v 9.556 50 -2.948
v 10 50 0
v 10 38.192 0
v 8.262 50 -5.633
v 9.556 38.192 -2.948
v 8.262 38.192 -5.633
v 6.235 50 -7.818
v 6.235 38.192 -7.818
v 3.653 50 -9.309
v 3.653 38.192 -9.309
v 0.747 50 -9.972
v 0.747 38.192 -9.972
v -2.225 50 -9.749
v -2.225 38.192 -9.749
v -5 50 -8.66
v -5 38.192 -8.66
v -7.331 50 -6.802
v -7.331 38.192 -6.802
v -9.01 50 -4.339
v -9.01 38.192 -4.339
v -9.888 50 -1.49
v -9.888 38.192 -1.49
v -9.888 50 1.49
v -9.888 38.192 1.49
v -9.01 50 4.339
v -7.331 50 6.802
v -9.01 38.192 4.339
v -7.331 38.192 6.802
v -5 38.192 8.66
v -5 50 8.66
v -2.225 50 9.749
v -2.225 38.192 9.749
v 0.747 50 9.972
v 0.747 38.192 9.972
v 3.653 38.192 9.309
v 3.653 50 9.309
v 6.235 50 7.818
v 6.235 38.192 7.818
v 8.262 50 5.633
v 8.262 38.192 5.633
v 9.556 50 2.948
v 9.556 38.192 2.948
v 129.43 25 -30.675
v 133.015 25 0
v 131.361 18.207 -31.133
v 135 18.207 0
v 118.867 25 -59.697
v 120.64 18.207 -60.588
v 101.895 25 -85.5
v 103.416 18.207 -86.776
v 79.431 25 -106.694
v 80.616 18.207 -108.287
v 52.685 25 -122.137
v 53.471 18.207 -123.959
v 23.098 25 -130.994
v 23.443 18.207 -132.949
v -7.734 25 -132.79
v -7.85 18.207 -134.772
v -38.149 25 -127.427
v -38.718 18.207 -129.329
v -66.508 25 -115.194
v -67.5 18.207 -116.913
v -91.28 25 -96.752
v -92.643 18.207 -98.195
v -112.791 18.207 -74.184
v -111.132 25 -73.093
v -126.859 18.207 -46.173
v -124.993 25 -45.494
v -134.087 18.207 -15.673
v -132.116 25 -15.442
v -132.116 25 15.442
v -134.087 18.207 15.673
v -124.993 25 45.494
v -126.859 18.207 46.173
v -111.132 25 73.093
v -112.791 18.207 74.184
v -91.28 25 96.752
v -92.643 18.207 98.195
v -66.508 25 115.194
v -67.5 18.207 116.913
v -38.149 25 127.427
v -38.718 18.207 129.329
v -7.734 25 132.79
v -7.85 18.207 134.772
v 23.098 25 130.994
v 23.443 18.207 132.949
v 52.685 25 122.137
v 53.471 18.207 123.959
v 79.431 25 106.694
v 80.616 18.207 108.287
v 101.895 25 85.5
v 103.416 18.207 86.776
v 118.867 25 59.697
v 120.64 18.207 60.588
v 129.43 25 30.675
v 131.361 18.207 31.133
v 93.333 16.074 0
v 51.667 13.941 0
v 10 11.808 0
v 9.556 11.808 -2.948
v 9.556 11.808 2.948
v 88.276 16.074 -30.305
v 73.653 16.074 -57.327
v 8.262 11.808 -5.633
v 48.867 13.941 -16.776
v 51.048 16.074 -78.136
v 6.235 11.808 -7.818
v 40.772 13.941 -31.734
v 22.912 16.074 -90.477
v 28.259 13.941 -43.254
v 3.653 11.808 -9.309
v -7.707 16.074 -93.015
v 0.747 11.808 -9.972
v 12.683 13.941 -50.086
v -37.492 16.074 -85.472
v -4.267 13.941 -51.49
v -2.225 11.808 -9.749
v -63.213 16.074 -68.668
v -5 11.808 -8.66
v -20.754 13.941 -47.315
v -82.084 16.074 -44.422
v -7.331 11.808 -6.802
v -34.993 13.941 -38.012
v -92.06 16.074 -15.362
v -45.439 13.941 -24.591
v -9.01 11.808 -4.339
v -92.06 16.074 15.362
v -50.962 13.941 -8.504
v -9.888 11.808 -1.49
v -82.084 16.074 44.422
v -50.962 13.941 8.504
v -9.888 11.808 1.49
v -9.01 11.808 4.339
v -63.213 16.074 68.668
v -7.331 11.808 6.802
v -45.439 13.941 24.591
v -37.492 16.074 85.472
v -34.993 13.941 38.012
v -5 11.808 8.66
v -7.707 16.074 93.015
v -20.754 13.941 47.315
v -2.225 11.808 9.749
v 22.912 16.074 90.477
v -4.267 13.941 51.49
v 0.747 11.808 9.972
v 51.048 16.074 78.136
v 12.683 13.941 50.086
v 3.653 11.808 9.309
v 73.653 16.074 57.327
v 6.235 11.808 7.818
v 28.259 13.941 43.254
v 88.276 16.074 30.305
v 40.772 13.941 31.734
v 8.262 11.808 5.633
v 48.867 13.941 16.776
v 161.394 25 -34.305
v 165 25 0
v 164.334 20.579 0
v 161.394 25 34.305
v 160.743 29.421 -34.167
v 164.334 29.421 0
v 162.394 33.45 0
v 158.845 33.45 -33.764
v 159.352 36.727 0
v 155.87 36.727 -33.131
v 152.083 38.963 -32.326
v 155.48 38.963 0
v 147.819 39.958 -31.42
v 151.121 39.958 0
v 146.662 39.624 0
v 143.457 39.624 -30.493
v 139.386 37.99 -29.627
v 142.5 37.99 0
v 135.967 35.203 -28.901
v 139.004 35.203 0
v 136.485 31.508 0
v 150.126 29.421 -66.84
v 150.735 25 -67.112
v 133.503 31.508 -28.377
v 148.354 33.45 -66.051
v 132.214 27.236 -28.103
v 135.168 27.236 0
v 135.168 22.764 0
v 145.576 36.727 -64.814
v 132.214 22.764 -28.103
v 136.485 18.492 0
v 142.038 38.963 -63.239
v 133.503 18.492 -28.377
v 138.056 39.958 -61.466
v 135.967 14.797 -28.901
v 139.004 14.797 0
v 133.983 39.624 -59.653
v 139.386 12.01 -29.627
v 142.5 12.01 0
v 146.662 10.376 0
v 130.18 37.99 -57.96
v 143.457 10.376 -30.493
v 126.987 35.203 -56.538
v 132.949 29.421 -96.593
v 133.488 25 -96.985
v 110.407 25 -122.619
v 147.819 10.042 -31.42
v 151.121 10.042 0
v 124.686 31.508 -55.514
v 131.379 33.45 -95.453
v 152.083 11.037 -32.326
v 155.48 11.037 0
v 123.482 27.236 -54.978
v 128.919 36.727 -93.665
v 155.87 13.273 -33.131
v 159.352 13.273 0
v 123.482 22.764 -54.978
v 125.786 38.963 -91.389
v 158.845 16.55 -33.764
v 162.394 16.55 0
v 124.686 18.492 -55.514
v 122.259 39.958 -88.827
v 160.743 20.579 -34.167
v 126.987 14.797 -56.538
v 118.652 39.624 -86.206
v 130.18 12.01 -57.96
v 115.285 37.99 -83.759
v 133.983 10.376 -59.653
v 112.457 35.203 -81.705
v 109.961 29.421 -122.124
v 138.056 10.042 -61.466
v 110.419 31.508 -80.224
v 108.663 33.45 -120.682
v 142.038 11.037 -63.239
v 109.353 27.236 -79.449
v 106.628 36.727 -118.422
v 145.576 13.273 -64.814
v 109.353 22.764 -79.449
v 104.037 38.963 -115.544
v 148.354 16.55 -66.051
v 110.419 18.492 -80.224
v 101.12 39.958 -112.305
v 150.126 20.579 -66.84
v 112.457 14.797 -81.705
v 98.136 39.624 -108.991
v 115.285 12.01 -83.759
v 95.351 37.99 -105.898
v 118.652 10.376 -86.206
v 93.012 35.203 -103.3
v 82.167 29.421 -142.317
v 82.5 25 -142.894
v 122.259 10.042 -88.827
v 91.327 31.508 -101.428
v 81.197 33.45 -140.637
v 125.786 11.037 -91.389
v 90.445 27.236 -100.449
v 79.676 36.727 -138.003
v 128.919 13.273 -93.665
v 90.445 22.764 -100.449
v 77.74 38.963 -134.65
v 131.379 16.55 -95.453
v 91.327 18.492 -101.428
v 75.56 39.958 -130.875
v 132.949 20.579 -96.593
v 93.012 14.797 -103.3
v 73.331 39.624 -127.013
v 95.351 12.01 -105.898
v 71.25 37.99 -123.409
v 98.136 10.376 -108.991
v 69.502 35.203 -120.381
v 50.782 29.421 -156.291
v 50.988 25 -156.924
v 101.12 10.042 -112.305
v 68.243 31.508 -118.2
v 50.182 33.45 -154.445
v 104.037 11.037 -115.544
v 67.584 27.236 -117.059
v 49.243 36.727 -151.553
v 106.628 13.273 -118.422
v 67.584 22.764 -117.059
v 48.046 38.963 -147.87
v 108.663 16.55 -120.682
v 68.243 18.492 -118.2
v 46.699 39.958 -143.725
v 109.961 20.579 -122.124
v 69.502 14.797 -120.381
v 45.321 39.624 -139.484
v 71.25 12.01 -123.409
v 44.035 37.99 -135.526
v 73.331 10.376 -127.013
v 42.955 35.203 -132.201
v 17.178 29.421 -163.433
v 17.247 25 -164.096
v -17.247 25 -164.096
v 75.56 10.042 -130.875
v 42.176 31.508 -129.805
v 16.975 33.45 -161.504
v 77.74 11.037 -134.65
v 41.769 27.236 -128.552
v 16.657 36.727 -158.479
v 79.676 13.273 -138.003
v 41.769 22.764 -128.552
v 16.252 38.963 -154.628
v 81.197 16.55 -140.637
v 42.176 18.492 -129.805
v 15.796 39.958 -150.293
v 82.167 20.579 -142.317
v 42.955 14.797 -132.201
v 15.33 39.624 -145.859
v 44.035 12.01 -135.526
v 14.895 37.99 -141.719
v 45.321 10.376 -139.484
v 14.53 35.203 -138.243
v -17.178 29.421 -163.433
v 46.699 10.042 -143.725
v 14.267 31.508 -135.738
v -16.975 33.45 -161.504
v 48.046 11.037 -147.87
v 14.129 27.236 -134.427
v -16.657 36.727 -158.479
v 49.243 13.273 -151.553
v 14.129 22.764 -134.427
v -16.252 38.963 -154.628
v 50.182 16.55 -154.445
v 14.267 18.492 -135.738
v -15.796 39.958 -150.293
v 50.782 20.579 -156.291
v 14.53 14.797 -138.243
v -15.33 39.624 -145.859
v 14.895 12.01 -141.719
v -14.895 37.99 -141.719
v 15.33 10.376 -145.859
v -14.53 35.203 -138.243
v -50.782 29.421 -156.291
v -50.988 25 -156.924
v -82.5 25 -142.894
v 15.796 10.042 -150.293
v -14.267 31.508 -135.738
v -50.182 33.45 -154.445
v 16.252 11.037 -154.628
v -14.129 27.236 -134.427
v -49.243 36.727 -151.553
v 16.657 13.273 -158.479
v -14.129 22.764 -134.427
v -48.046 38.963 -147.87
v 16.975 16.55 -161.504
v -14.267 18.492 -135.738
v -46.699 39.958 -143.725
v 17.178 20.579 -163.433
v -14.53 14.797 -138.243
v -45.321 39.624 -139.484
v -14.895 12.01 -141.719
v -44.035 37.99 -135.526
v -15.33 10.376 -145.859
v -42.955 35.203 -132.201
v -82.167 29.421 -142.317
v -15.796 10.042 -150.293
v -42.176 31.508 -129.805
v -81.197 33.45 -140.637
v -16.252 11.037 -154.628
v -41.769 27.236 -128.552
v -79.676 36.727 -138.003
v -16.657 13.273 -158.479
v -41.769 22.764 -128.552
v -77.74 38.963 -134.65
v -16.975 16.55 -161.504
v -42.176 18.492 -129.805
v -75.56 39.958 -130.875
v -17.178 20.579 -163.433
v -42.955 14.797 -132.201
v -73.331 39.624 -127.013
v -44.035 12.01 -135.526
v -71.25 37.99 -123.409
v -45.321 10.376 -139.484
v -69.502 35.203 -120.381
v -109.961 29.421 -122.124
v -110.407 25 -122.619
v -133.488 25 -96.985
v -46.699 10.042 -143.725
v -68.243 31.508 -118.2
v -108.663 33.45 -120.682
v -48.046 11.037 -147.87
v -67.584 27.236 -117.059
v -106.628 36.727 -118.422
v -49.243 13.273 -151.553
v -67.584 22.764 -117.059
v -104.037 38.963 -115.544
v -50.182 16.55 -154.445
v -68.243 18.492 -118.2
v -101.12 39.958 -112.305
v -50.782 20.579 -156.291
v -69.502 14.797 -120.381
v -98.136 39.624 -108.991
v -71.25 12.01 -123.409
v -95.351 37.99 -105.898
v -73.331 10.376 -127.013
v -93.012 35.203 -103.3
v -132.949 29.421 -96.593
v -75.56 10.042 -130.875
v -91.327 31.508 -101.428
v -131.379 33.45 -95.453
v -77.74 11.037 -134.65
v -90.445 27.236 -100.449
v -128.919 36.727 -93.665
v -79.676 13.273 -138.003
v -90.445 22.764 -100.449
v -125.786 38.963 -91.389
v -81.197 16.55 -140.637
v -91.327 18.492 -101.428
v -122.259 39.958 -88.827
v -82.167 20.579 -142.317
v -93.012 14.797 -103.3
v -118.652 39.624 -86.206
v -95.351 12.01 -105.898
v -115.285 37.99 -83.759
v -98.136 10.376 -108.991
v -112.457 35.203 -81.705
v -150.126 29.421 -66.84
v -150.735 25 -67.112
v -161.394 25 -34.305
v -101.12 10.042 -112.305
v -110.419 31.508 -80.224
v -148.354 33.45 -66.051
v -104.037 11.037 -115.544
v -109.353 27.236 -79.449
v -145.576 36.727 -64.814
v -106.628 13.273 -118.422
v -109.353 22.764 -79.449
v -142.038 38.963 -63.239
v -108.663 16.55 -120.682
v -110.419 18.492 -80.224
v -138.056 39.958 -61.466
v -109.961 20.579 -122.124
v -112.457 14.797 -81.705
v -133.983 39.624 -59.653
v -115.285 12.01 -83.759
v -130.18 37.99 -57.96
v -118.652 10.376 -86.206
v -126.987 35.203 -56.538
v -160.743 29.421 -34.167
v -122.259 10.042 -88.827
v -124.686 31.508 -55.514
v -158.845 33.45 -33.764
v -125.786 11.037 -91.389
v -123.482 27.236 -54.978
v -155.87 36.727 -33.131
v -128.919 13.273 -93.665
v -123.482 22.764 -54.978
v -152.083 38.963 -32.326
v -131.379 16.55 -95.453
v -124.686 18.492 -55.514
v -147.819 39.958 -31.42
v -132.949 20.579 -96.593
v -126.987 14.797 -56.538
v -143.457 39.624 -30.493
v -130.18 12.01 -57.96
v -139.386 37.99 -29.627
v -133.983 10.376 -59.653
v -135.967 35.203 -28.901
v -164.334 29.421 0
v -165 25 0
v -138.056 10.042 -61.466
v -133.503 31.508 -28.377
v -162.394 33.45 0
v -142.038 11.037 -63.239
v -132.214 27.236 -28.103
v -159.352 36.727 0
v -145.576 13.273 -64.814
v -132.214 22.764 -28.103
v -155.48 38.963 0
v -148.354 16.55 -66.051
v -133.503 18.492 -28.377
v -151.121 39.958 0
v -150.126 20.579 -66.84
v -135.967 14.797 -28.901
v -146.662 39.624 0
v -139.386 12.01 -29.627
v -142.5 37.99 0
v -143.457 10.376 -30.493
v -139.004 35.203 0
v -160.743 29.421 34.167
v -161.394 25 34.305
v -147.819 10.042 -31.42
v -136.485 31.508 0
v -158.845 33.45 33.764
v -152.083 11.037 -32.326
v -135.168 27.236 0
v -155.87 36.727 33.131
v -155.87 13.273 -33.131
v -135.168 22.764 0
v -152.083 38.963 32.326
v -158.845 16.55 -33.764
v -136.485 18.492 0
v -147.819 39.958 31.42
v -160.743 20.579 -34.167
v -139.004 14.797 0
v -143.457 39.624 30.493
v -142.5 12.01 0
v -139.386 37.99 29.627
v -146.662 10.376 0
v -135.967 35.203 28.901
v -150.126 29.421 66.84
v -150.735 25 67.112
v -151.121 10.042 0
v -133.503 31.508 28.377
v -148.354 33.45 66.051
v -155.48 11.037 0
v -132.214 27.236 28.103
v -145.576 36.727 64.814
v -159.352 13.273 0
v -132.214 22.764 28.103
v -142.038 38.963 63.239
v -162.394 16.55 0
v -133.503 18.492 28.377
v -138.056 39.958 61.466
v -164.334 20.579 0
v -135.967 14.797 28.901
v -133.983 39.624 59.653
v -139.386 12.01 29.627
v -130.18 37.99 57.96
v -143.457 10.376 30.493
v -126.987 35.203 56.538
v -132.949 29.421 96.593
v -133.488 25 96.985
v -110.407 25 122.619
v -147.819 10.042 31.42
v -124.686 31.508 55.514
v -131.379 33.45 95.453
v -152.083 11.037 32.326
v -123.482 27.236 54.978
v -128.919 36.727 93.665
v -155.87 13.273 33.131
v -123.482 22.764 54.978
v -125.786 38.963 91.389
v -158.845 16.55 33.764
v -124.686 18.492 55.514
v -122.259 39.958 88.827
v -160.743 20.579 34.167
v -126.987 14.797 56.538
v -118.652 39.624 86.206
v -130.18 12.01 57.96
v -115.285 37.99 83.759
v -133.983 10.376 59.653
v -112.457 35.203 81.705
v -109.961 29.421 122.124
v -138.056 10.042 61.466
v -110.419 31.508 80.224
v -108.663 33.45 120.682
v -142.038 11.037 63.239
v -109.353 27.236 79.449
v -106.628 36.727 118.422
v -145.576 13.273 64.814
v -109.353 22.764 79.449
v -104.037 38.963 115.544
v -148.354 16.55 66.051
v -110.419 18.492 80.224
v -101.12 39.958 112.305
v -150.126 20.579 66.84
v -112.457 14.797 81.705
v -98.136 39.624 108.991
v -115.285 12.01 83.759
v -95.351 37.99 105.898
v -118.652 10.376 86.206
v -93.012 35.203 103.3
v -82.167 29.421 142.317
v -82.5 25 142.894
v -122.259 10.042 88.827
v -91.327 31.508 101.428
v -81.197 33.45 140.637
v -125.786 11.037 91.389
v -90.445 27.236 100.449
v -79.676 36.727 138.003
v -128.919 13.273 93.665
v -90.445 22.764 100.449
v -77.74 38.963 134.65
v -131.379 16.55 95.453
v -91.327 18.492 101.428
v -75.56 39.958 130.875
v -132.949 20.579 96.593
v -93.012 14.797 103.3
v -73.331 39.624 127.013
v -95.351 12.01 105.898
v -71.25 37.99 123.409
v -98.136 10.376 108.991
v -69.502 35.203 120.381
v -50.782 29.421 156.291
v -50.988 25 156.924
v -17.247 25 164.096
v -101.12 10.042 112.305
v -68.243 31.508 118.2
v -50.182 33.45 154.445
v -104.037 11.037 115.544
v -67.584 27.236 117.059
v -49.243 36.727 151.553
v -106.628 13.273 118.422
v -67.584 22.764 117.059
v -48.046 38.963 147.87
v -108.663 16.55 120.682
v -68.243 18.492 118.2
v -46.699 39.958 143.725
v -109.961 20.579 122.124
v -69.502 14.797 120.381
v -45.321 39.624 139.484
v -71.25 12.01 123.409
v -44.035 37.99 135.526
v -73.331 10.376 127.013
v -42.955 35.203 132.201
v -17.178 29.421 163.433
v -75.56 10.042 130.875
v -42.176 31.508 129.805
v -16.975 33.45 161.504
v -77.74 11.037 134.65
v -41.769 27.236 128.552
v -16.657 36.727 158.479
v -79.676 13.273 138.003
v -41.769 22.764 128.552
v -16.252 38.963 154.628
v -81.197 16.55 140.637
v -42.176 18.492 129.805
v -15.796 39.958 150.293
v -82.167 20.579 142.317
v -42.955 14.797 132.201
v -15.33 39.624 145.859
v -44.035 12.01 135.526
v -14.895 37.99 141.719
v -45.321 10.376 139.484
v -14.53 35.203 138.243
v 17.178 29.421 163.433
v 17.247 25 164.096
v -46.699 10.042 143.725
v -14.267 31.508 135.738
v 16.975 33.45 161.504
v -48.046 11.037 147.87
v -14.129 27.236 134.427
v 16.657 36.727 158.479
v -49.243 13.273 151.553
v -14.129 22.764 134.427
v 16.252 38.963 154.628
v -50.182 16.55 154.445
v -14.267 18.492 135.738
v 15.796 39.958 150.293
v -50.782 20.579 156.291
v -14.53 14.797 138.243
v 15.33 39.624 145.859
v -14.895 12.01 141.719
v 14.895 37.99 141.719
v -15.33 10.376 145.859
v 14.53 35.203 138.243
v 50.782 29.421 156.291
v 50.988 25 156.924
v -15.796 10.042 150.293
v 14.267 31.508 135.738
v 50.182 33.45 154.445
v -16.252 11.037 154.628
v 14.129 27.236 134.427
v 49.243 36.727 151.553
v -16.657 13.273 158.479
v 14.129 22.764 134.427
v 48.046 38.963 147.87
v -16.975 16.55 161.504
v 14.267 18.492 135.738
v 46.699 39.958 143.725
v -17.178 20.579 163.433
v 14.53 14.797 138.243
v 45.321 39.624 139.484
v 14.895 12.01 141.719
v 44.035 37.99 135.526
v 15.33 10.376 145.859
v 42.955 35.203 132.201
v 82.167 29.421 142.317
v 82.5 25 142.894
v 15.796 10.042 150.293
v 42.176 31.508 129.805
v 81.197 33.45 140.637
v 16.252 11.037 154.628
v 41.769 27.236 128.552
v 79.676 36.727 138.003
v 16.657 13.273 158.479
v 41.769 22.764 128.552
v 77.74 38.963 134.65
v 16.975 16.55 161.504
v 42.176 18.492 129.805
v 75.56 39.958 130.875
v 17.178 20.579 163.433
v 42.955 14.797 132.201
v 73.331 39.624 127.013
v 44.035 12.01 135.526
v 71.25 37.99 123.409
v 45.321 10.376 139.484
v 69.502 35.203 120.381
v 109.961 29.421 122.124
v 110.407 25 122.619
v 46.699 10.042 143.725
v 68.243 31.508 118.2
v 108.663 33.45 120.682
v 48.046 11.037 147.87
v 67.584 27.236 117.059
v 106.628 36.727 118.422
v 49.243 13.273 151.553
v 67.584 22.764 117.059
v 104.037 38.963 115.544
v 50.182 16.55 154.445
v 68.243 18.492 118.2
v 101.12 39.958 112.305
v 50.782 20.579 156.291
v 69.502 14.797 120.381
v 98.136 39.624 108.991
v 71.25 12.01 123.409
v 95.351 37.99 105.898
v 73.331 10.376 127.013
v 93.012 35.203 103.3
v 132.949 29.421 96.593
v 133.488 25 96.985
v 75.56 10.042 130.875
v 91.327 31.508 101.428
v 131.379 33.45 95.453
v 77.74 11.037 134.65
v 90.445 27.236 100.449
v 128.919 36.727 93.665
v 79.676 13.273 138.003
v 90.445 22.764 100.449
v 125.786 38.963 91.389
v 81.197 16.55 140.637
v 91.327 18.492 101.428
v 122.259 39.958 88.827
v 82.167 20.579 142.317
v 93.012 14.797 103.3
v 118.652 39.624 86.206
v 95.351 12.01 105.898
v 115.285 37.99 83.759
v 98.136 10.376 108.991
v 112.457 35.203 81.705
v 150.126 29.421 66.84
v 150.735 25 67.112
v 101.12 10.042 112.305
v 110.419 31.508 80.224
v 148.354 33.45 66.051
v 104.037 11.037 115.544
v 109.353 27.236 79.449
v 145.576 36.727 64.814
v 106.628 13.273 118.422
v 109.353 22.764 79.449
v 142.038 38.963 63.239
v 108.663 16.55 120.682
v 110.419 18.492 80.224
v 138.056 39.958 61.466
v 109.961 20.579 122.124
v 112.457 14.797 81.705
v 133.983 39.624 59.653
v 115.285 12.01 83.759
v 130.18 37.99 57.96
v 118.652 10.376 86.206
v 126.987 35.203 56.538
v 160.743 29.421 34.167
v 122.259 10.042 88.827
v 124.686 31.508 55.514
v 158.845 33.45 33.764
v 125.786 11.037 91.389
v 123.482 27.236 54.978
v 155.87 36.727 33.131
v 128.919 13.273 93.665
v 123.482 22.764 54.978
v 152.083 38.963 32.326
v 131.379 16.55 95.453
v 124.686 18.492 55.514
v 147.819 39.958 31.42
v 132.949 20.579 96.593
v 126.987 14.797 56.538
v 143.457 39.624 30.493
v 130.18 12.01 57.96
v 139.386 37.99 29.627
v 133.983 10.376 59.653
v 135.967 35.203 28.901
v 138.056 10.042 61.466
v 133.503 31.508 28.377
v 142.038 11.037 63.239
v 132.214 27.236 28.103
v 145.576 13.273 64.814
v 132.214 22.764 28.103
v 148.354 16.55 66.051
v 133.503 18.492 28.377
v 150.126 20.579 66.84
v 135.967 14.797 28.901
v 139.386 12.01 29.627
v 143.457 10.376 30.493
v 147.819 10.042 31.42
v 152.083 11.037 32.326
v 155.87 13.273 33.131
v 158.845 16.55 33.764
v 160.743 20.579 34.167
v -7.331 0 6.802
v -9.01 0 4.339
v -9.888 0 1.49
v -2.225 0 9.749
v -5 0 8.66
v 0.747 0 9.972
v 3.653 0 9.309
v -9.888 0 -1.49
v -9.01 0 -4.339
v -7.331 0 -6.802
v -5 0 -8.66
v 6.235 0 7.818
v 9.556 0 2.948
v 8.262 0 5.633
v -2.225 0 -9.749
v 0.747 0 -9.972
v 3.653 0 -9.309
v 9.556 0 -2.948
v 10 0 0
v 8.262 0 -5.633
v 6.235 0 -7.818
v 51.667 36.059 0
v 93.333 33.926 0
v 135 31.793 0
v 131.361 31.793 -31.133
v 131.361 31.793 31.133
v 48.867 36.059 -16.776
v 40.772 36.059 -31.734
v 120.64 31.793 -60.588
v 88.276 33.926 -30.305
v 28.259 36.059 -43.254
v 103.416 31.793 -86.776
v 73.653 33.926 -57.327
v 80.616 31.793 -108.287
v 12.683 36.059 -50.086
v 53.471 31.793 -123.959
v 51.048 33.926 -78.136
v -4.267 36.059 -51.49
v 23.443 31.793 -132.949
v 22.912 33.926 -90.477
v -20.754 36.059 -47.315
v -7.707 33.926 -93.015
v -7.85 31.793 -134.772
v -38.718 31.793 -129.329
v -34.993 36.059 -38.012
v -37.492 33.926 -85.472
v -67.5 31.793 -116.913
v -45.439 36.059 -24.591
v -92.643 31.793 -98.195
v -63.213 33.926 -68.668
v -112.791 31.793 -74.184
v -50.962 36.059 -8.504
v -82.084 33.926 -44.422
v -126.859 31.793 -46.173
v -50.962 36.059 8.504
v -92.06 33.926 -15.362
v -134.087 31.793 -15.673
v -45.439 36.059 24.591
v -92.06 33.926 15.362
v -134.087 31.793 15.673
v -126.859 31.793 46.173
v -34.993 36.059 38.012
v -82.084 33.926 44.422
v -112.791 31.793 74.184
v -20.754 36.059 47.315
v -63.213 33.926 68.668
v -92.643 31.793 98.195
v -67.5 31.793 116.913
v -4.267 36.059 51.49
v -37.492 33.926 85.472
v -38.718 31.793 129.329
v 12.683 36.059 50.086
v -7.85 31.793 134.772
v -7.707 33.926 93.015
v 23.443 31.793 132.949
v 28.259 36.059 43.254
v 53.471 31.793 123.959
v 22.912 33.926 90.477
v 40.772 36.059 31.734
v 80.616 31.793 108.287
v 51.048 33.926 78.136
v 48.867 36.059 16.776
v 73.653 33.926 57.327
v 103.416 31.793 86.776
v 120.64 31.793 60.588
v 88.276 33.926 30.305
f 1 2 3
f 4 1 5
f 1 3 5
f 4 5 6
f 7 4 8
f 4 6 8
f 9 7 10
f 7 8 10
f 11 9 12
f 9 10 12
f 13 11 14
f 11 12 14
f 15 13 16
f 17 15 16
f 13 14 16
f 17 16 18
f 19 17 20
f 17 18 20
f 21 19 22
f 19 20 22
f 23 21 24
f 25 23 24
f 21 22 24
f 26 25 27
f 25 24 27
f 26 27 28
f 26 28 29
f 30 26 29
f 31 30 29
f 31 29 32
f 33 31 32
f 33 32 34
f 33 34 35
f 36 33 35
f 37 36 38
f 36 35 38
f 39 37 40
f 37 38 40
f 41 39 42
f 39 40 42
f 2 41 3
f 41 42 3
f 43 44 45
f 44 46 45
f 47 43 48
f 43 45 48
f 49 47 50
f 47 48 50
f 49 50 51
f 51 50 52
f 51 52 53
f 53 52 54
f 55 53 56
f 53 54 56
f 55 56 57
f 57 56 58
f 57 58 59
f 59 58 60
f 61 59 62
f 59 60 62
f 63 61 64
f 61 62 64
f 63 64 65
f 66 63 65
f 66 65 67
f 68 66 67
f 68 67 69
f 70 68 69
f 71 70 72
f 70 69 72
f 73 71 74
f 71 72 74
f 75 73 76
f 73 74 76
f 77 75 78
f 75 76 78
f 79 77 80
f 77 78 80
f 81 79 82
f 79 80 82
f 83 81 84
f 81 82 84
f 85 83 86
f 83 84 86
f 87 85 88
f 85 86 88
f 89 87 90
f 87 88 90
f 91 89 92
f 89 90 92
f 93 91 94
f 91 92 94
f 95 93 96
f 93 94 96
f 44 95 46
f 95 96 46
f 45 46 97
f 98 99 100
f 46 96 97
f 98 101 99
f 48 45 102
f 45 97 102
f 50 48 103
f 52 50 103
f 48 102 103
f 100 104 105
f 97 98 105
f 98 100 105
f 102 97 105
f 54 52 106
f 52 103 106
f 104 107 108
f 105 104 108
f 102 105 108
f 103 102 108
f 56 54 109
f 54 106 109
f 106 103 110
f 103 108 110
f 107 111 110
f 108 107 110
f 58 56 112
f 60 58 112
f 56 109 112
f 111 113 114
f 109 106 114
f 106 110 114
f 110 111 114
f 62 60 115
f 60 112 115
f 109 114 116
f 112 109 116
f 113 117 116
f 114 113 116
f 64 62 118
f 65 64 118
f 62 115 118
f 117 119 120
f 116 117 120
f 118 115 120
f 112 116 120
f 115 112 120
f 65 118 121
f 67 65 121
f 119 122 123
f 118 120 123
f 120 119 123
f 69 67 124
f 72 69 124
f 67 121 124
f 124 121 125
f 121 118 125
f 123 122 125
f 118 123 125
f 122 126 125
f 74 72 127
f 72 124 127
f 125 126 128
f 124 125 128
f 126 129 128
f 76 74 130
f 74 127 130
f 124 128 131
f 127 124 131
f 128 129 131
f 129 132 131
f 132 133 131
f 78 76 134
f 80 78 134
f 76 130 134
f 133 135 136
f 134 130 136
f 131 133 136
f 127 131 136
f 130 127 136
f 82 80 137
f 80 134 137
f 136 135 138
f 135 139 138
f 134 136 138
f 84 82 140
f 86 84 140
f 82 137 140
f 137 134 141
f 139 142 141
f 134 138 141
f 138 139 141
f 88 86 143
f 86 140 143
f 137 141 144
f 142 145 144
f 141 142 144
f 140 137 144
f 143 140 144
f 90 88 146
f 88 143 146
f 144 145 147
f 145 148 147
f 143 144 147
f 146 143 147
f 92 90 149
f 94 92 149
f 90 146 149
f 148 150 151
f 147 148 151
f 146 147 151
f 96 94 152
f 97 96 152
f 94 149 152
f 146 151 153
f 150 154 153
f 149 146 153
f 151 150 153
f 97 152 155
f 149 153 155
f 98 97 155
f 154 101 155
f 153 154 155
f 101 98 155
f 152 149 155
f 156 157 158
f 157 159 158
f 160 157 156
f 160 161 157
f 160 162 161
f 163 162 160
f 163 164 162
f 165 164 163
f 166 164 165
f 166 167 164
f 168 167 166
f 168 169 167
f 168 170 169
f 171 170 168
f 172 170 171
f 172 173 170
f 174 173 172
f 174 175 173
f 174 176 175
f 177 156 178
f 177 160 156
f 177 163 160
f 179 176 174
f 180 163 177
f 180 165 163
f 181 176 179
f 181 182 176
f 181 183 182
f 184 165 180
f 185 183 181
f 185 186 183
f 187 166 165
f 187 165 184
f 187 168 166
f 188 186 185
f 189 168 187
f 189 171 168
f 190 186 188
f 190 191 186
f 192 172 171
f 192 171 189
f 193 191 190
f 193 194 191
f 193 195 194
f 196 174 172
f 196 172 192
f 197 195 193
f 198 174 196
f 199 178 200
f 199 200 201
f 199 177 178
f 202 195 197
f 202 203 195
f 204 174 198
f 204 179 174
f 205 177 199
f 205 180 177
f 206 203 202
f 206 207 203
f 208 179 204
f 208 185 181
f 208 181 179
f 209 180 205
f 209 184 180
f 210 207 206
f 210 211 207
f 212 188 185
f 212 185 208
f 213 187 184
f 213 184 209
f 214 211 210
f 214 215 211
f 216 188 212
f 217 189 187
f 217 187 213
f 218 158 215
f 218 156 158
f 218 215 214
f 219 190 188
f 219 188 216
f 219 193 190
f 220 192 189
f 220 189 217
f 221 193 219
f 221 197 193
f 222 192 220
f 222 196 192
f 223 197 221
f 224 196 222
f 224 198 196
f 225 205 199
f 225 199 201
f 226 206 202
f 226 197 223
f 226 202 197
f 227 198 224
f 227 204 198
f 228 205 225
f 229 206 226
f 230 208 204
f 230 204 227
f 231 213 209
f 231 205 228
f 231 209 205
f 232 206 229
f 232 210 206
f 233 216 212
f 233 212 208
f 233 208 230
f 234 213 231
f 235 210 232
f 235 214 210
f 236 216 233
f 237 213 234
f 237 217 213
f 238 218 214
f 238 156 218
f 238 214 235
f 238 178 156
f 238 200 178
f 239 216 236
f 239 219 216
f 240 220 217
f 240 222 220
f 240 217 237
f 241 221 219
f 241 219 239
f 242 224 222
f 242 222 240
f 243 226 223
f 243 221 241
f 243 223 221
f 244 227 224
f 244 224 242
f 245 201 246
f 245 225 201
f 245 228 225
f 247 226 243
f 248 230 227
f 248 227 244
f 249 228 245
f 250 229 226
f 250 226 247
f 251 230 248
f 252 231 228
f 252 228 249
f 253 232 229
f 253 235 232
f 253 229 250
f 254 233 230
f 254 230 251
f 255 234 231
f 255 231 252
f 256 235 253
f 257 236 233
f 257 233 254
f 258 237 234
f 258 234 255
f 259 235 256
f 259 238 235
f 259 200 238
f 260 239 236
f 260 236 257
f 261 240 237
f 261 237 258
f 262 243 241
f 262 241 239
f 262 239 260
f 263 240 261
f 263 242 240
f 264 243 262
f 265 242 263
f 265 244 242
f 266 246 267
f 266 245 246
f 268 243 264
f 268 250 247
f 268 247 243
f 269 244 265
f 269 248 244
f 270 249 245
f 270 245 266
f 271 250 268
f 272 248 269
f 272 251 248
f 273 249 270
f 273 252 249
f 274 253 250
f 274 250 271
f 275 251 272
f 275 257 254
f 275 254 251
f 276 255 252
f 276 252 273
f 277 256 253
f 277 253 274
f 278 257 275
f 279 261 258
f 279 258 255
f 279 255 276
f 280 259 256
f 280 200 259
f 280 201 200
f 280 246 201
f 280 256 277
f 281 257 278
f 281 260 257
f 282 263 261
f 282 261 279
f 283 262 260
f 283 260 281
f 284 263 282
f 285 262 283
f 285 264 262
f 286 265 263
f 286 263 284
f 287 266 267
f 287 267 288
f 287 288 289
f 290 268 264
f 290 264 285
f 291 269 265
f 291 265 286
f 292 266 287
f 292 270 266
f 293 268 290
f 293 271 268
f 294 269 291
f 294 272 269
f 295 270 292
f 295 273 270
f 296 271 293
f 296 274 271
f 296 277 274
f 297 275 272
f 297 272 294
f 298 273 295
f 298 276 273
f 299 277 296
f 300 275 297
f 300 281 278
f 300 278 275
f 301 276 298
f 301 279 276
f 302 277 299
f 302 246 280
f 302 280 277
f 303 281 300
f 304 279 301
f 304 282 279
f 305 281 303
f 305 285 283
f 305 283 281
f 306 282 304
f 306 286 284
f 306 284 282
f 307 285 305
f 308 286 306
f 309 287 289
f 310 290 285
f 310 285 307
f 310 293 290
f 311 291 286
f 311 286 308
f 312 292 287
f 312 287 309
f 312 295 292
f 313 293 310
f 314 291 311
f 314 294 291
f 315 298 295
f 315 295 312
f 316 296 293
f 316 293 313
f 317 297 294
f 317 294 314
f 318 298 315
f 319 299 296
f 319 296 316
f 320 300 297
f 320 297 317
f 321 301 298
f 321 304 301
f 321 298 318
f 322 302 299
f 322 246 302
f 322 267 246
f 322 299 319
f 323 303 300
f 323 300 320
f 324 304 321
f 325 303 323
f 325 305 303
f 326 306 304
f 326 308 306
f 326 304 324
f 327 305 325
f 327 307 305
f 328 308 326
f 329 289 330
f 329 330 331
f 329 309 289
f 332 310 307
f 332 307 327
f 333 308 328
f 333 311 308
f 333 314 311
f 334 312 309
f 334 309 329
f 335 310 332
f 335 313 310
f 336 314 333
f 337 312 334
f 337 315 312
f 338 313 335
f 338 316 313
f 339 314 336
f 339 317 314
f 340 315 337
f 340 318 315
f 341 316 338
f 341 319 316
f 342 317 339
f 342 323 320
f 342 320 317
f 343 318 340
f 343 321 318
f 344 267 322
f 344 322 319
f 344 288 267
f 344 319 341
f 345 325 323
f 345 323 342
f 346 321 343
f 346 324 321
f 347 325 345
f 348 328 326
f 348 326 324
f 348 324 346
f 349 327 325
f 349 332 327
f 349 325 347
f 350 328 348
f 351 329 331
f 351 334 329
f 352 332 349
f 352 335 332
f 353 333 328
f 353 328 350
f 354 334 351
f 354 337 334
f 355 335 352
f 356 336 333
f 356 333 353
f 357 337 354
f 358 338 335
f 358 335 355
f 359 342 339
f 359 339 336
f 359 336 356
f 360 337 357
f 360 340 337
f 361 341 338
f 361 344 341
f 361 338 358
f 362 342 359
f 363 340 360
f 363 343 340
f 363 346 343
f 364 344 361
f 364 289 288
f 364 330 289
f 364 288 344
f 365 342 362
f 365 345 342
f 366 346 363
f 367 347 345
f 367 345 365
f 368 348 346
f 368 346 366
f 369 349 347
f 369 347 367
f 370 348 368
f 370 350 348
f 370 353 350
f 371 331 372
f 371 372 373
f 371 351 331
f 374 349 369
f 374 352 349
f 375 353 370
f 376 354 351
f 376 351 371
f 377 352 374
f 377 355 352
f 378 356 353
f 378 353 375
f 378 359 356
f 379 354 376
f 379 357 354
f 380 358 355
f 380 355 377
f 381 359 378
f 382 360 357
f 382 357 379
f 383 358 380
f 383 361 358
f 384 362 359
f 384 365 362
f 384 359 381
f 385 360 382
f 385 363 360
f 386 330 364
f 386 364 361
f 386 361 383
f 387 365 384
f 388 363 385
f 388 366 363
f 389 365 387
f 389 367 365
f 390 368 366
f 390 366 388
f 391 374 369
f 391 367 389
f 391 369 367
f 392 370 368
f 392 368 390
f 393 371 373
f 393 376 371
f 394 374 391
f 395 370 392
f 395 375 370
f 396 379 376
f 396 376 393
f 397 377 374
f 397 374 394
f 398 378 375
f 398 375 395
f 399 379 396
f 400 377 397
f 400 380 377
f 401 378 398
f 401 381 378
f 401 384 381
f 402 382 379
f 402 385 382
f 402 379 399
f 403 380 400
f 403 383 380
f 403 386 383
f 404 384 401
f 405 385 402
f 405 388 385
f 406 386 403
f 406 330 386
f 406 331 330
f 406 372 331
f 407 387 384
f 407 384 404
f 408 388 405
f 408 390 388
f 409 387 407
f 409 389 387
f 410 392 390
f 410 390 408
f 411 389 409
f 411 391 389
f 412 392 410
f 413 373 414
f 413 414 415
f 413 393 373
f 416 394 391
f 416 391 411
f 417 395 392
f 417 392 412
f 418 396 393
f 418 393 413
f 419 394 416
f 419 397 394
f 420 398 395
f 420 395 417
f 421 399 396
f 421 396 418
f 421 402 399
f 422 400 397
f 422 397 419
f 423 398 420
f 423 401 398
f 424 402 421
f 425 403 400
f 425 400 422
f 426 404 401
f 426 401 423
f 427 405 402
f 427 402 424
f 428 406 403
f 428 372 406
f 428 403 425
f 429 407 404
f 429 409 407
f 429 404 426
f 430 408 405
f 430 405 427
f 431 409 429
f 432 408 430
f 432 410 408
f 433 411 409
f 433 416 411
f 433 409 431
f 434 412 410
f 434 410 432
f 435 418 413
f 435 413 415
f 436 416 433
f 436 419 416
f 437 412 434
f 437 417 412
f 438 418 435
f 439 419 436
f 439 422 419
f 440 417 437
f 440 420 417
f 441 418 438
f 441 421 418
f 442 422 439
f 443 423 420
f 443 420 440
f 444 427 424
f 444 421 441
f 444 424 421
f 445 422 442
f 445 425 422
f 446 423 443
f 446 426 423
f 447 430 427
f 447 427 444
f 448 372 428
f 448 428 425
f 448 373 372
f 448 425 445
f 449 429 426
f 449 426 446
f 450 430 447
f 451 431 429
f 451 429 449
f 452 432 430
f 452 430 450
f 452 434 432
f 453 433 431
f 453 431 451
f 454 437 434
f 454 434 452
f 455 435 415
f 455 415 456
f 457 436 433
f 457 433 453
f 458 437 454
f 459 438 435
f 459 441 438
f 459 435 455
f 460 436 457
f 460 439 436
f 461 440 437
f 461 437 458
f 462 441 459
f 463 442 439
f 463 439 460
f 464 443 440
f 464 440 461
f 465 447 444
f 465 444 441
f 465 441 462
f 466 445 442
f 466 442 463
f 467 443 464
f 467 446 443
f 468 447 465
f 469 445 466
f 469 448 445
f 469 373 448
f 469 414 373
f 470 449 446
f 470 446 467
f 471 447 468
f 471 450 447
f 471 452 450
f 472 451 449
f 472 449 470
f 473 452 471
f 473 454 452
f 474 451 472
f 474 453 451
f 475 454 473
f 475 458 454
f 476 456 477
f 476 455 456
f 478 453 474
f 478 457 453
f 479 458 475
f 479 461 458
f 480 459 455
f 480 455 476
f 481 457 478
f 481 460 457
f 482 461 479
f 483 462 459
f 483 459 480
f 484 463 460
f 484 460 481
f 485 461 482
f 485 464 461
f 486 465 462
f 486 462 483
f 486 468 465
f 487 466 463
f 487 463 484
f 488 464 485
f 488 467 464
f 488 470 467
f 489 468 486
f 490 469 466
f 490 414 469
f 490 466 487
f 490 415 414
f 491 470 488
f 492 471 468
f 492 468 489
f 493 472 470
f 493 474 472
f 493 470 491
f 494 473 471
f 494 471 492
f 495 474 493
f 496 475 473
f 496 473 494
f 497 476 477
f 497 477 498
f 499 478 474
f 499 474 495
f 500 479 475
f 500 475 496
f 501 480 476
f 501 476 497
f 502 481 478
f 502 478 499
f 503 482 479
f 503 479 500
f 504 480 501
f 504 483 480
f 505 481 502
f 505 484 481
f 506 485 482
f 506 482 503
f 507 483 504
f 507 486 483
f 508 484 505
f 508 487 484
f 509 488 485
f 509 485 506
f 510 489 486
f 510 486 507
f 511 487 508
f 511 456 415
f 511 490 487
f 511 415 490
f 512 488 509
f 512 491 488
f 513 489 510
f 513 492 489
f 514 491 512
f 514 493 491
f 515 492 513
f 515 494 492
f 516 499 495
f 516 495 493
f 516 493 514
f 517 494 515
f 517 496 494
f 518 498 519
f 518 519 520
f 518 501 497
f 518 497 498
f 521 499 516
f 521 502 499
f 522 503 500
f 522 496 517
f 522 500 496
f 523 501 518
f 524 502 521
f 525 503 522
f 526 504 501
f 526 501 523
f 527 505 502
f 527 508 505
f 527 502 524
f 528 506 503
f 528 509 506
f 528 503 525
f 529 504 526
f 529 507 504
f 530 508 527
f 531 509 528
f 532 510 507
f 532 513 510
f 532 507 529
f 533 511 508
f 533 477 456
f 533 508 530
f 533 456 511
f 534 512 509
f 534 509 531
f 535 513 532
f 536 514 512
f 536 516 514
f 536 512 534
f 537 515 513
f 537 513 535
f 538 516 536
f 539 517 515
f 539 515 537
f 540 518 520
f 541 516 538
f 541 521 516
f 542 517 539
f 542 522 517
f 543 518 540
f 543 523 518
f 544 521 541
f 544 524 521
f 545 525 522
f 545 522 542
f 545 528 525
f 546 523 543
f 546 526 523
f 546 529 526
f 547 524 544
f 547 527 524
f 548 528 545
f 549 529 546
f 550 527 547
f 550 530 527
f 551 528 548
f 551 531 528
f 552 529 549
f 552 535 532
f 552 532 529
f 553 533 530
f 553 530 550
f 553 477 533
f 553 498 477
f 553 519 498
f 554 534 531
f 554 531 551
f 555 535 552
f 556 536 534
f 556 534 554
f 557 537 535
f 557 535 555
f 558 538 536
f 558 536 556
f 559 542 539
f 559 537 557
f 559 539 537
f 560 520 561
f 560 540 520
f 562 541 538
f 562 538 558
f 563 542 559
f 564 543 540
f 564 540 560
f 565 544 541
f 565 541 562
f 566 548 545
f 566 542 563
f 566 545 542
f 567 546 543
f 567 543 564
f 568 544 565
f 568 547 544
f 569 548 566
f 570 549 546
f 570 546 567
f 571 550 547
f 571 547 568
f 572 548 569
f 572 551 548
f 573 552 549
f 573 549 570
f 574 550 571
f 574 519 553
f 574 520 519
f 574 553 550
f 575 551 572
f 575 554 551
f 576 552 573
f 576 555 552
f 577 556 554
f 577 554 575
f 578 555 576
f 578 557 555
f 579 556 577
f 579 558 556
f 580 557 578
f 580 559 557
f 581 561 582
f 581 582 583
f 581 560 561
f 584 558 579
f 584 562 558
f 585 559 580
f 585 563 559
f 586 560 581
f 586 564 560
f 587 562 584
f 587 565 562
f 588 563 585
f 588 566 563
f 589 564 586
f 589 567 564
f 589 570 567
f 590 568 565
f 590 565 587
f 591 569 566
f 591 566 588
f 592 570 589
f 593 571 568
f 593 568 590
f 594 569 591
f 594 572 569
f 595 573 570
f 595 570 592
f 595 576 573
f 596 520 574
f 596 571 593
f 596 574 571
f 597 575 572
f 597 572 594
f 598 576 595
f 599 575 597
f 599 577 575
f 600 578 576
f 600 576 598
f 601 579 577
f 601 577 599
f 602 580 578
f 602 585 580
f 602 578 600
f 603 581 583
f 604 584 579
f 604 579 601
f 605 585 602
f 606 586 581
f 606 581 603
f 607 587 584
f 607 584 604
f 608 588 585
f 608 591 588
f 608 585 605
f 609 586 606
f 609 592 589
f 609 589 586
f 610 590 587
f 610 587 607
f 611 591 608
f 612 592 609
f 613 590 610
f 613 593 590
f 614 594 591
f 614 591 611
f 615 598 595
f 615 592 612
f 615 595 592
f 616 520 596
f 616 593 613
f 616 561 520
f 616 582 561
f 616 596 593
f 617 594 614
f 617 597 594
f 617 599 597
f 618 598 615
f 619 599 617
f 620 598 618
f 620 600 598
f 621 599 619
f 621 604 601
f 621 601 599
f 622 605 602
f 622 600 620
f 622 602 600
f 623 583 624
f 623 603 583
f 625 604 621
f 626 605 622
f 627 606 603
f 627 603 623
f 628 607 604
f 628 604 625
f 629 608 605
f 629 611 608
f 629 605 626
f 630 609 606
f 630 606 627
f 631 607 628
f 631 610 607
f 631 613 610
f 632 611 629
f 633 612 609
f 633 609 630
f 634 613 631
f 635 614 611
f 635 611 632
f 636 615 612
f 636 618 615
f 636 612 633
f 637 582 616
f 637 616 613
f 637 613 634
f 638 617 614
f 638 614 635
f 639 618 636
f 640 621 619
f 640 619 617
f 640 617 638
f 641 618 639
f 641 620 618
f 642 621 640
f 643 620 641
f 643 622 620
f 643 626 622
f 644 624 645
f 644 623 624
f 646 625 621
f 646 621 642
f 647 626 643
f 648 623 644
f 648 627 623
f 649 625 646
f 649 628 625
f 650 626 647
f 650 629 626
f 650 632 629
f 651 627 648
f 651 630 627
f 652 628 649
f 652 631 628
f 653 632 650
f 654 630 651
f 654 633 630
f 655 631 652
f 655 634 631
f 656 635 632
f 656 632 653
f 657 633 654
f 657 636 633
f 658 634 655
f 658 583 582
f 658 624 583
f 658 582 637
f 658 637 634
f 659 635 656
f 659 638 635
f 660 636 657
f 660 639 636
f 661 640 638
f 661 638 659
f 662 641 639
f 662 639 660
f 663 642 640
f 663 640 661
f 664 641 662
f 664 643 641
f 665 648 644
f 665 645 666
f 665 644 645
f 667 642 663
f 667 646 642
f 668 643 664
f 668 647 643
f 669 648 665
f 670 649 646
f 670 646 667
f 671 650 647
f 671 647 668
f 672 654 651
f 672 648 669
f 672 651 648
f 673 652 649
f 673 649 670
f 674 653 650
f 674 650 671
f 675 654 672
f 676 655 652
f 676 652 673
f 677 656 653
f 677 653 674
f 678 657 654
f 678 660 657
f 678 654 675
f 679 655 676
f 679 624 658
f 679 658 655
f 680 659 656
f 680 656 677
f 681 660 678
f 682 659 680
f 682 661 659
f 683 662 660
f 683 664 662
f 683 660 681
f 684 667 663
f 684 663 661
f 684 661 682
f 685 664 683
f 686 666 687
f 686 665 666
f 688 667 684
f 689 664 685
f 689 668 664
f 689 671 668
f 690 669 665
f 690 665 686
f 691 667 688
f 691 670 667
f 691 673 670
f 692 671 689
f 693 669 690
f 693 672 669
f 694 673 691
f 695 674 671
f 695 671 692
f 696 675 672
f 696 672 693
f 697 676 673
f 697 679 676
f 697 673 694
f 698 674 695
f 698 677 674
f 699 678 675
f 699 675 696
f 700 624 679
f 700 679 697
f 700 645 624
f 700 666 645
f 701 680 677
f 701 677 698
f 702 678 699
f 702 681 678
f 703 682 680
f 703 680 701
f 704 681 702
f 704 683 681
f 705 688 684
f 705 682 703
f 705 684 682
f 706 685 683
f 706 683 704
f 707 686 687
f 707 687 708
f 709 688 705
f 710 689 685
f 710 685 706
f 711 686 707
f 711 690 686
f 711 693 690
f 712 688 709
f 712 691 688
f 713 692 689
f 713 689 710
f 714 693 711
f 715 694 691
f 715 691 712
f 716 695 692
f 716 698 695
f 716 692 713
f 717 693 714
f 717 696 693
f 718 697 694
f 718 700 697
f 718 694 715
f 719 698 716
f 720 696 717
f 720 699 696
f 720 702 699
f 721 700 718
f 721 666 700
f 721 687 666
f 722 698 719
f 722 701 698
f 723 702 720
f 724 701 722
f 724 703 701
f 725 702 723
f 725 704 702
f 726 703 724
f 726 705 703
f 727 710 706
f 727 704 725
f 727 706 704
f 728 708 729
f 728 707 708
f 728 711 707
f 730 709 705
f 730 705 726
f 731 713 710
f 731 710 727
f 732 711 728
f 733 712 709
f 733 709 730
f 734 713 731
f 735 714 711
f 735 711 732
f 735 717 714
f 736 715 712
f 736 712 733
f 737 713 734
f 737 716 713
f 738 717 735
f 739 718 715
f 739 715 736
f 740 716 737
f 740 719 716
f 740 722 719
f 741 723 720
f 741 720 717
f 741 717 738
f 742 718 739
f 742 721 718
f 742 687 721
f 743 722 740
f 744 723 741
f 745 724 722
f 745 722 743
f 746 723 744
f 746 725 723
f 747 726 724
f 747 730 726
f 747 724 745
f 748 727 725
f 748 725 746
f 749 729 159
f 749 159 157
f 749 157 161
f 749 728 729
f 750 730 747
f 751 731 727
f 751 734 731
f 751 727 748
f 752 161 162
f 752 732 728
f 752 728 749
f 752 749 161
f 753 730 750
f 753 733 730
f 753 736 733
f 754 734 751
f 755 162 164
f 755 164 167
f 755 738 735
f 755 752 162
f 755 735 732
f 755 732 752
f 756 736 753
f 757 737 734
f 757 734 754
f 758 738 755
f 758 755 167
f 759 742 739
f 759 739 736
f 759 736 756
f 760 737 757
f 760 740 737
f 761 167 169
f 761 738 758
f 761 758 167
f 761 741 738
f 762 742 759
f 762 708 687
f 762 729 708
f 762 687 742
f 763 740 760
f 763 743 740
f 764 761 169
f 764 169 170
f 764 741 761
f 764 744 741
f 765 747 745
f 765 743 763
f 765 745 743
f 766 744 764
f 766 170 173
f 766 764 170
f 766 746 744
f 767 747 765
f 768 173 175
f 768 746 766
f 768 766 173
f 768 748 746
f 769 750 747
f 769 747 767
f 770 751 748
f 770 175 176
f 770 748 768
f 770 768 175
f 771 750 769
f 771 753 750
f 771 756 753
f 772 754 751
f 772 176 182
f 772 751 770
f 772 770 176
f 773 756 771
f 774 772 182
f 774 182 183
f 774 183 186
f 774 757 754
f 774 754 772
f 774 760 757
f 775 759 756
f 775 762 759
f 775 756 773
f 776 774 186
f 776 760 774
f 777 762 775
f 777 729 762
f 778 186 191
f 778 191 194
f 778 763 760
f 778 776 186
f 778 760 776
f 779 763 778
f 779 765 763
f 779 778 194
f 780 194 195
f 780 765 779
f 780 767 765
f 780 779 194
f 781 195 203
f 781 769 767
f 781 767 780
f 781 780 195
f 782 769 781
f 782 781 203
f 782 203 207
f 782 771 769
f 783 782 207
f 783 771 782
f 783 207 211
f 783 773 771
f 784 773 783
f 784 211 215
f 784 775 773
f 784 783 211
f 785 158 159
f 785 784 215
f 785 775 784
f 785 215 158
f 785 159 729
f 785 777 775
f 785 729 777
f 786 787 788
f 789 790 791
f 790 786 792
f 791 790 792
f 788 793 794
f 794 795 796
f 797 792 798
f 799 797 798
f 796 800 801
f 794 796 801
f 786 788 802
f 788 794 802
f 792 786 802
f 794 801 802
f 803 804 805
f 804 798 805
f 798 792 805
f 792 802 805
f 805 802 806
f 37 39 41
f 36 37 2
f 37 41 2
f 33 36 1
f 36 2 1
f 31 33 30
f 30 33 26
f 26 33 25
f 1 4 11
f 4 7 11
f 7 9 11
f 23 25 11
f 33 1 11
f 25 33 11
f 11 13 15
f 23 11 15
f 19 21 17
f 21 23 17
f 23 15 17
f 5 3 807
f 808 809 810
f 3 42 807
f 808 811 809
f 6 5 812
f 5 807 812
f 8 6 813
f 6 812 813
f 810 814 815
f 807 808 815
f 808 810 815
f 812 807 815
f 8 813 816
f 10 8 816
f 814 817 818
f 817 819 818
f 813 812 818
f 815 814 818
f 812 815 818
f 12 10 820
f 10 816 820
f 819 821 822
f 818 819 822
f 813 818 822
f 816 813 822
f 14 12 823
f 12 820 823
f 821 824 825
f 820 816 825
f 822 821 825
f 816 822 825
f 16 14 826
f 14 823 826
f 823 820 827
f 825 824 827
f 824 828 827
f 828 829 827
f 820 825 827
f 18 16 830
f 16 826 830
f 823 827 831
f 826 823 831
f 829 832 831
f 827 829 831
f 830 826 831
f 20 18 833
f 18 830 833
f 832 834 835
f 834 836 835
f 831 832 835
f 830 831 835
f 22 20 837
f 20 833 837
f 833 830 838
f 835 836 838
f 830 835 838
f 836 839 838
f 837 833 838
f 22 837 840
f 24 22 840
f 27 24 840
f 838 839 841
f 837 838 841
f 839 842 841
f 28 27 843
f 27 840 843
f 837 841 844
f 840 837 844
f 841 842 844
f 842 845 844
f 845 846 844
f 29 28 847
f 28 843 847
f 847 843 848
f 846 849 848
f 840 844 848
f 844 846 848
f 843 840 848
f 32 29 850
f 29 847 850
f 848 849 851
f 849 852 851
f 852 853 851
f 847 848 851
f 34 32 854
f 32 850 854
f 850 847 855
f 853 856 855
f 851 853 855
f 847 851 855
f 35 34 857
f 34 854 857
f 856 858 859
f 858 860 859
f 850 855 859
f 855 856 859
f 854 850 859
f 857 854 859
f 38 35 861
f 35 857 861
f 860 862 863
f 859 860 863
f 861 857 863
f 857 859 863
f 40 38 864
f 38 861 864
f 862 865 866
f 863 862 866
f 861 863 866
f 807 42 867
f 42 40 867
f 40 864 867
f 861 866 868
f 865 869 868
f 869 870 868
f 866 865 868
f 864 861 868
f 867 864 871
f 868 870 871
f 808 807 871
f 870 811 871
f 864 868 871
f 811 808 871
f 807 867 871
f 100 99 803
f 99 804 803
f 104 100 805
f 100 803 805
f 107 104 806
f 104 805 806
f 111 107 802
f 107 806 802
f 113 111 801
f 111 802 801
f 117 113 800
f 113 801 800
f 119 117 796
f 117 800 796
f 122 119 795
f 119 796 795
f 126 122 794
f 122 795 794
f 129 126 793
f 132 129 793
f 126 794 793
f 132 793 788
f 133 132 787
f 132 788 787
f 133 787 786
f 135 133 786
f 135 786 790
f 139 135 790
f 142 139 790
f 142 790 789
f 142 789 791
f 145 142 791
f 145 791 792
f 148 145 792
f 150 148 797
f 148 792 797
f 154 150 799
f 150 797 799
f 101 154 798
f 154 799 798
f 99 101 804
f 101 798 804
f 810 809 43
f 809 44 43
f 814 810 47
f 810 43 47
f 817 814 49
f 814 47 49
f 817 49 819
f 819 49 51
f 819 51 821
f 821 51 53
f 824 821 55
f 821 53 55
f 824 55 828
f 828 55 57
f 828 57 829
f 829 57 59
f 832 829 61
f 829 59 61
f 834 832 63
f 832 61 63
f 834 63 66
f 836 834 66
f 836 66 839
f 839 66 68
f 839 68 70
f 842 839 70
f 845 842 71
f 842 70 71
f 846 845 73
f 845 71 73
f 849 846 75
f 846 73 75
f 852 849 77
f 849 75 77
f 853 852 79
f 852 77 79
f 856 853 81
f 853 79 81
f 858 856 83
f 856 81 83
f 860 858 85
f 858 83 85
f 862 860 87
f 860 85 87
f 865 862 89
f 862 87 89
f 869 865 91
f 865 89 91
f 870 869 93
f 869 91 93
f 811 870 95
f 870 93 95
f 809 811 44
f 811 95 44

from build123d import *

# Parameters (mm, degrees)
ESQUISSE1_R = 15


with BuildPart() as part:
    # Esquisse1 → Révolution1 (revolve)
    with BuildSketch(Plane.XY):
        with Locations((150, 25)):
            Circle(ESQUISSE1_R)
        Polygon((0, 50), (10, 50), (10, 38.192482169), (135, 31.79272492), (133.015042214, 25), (135, 18.20727508), (10, 11.807517831), (10, 0), (0, 0), align=None)
    revolve(axis=Axis((0, 0, 0), (0, 1, 0)))


solid = part.part
